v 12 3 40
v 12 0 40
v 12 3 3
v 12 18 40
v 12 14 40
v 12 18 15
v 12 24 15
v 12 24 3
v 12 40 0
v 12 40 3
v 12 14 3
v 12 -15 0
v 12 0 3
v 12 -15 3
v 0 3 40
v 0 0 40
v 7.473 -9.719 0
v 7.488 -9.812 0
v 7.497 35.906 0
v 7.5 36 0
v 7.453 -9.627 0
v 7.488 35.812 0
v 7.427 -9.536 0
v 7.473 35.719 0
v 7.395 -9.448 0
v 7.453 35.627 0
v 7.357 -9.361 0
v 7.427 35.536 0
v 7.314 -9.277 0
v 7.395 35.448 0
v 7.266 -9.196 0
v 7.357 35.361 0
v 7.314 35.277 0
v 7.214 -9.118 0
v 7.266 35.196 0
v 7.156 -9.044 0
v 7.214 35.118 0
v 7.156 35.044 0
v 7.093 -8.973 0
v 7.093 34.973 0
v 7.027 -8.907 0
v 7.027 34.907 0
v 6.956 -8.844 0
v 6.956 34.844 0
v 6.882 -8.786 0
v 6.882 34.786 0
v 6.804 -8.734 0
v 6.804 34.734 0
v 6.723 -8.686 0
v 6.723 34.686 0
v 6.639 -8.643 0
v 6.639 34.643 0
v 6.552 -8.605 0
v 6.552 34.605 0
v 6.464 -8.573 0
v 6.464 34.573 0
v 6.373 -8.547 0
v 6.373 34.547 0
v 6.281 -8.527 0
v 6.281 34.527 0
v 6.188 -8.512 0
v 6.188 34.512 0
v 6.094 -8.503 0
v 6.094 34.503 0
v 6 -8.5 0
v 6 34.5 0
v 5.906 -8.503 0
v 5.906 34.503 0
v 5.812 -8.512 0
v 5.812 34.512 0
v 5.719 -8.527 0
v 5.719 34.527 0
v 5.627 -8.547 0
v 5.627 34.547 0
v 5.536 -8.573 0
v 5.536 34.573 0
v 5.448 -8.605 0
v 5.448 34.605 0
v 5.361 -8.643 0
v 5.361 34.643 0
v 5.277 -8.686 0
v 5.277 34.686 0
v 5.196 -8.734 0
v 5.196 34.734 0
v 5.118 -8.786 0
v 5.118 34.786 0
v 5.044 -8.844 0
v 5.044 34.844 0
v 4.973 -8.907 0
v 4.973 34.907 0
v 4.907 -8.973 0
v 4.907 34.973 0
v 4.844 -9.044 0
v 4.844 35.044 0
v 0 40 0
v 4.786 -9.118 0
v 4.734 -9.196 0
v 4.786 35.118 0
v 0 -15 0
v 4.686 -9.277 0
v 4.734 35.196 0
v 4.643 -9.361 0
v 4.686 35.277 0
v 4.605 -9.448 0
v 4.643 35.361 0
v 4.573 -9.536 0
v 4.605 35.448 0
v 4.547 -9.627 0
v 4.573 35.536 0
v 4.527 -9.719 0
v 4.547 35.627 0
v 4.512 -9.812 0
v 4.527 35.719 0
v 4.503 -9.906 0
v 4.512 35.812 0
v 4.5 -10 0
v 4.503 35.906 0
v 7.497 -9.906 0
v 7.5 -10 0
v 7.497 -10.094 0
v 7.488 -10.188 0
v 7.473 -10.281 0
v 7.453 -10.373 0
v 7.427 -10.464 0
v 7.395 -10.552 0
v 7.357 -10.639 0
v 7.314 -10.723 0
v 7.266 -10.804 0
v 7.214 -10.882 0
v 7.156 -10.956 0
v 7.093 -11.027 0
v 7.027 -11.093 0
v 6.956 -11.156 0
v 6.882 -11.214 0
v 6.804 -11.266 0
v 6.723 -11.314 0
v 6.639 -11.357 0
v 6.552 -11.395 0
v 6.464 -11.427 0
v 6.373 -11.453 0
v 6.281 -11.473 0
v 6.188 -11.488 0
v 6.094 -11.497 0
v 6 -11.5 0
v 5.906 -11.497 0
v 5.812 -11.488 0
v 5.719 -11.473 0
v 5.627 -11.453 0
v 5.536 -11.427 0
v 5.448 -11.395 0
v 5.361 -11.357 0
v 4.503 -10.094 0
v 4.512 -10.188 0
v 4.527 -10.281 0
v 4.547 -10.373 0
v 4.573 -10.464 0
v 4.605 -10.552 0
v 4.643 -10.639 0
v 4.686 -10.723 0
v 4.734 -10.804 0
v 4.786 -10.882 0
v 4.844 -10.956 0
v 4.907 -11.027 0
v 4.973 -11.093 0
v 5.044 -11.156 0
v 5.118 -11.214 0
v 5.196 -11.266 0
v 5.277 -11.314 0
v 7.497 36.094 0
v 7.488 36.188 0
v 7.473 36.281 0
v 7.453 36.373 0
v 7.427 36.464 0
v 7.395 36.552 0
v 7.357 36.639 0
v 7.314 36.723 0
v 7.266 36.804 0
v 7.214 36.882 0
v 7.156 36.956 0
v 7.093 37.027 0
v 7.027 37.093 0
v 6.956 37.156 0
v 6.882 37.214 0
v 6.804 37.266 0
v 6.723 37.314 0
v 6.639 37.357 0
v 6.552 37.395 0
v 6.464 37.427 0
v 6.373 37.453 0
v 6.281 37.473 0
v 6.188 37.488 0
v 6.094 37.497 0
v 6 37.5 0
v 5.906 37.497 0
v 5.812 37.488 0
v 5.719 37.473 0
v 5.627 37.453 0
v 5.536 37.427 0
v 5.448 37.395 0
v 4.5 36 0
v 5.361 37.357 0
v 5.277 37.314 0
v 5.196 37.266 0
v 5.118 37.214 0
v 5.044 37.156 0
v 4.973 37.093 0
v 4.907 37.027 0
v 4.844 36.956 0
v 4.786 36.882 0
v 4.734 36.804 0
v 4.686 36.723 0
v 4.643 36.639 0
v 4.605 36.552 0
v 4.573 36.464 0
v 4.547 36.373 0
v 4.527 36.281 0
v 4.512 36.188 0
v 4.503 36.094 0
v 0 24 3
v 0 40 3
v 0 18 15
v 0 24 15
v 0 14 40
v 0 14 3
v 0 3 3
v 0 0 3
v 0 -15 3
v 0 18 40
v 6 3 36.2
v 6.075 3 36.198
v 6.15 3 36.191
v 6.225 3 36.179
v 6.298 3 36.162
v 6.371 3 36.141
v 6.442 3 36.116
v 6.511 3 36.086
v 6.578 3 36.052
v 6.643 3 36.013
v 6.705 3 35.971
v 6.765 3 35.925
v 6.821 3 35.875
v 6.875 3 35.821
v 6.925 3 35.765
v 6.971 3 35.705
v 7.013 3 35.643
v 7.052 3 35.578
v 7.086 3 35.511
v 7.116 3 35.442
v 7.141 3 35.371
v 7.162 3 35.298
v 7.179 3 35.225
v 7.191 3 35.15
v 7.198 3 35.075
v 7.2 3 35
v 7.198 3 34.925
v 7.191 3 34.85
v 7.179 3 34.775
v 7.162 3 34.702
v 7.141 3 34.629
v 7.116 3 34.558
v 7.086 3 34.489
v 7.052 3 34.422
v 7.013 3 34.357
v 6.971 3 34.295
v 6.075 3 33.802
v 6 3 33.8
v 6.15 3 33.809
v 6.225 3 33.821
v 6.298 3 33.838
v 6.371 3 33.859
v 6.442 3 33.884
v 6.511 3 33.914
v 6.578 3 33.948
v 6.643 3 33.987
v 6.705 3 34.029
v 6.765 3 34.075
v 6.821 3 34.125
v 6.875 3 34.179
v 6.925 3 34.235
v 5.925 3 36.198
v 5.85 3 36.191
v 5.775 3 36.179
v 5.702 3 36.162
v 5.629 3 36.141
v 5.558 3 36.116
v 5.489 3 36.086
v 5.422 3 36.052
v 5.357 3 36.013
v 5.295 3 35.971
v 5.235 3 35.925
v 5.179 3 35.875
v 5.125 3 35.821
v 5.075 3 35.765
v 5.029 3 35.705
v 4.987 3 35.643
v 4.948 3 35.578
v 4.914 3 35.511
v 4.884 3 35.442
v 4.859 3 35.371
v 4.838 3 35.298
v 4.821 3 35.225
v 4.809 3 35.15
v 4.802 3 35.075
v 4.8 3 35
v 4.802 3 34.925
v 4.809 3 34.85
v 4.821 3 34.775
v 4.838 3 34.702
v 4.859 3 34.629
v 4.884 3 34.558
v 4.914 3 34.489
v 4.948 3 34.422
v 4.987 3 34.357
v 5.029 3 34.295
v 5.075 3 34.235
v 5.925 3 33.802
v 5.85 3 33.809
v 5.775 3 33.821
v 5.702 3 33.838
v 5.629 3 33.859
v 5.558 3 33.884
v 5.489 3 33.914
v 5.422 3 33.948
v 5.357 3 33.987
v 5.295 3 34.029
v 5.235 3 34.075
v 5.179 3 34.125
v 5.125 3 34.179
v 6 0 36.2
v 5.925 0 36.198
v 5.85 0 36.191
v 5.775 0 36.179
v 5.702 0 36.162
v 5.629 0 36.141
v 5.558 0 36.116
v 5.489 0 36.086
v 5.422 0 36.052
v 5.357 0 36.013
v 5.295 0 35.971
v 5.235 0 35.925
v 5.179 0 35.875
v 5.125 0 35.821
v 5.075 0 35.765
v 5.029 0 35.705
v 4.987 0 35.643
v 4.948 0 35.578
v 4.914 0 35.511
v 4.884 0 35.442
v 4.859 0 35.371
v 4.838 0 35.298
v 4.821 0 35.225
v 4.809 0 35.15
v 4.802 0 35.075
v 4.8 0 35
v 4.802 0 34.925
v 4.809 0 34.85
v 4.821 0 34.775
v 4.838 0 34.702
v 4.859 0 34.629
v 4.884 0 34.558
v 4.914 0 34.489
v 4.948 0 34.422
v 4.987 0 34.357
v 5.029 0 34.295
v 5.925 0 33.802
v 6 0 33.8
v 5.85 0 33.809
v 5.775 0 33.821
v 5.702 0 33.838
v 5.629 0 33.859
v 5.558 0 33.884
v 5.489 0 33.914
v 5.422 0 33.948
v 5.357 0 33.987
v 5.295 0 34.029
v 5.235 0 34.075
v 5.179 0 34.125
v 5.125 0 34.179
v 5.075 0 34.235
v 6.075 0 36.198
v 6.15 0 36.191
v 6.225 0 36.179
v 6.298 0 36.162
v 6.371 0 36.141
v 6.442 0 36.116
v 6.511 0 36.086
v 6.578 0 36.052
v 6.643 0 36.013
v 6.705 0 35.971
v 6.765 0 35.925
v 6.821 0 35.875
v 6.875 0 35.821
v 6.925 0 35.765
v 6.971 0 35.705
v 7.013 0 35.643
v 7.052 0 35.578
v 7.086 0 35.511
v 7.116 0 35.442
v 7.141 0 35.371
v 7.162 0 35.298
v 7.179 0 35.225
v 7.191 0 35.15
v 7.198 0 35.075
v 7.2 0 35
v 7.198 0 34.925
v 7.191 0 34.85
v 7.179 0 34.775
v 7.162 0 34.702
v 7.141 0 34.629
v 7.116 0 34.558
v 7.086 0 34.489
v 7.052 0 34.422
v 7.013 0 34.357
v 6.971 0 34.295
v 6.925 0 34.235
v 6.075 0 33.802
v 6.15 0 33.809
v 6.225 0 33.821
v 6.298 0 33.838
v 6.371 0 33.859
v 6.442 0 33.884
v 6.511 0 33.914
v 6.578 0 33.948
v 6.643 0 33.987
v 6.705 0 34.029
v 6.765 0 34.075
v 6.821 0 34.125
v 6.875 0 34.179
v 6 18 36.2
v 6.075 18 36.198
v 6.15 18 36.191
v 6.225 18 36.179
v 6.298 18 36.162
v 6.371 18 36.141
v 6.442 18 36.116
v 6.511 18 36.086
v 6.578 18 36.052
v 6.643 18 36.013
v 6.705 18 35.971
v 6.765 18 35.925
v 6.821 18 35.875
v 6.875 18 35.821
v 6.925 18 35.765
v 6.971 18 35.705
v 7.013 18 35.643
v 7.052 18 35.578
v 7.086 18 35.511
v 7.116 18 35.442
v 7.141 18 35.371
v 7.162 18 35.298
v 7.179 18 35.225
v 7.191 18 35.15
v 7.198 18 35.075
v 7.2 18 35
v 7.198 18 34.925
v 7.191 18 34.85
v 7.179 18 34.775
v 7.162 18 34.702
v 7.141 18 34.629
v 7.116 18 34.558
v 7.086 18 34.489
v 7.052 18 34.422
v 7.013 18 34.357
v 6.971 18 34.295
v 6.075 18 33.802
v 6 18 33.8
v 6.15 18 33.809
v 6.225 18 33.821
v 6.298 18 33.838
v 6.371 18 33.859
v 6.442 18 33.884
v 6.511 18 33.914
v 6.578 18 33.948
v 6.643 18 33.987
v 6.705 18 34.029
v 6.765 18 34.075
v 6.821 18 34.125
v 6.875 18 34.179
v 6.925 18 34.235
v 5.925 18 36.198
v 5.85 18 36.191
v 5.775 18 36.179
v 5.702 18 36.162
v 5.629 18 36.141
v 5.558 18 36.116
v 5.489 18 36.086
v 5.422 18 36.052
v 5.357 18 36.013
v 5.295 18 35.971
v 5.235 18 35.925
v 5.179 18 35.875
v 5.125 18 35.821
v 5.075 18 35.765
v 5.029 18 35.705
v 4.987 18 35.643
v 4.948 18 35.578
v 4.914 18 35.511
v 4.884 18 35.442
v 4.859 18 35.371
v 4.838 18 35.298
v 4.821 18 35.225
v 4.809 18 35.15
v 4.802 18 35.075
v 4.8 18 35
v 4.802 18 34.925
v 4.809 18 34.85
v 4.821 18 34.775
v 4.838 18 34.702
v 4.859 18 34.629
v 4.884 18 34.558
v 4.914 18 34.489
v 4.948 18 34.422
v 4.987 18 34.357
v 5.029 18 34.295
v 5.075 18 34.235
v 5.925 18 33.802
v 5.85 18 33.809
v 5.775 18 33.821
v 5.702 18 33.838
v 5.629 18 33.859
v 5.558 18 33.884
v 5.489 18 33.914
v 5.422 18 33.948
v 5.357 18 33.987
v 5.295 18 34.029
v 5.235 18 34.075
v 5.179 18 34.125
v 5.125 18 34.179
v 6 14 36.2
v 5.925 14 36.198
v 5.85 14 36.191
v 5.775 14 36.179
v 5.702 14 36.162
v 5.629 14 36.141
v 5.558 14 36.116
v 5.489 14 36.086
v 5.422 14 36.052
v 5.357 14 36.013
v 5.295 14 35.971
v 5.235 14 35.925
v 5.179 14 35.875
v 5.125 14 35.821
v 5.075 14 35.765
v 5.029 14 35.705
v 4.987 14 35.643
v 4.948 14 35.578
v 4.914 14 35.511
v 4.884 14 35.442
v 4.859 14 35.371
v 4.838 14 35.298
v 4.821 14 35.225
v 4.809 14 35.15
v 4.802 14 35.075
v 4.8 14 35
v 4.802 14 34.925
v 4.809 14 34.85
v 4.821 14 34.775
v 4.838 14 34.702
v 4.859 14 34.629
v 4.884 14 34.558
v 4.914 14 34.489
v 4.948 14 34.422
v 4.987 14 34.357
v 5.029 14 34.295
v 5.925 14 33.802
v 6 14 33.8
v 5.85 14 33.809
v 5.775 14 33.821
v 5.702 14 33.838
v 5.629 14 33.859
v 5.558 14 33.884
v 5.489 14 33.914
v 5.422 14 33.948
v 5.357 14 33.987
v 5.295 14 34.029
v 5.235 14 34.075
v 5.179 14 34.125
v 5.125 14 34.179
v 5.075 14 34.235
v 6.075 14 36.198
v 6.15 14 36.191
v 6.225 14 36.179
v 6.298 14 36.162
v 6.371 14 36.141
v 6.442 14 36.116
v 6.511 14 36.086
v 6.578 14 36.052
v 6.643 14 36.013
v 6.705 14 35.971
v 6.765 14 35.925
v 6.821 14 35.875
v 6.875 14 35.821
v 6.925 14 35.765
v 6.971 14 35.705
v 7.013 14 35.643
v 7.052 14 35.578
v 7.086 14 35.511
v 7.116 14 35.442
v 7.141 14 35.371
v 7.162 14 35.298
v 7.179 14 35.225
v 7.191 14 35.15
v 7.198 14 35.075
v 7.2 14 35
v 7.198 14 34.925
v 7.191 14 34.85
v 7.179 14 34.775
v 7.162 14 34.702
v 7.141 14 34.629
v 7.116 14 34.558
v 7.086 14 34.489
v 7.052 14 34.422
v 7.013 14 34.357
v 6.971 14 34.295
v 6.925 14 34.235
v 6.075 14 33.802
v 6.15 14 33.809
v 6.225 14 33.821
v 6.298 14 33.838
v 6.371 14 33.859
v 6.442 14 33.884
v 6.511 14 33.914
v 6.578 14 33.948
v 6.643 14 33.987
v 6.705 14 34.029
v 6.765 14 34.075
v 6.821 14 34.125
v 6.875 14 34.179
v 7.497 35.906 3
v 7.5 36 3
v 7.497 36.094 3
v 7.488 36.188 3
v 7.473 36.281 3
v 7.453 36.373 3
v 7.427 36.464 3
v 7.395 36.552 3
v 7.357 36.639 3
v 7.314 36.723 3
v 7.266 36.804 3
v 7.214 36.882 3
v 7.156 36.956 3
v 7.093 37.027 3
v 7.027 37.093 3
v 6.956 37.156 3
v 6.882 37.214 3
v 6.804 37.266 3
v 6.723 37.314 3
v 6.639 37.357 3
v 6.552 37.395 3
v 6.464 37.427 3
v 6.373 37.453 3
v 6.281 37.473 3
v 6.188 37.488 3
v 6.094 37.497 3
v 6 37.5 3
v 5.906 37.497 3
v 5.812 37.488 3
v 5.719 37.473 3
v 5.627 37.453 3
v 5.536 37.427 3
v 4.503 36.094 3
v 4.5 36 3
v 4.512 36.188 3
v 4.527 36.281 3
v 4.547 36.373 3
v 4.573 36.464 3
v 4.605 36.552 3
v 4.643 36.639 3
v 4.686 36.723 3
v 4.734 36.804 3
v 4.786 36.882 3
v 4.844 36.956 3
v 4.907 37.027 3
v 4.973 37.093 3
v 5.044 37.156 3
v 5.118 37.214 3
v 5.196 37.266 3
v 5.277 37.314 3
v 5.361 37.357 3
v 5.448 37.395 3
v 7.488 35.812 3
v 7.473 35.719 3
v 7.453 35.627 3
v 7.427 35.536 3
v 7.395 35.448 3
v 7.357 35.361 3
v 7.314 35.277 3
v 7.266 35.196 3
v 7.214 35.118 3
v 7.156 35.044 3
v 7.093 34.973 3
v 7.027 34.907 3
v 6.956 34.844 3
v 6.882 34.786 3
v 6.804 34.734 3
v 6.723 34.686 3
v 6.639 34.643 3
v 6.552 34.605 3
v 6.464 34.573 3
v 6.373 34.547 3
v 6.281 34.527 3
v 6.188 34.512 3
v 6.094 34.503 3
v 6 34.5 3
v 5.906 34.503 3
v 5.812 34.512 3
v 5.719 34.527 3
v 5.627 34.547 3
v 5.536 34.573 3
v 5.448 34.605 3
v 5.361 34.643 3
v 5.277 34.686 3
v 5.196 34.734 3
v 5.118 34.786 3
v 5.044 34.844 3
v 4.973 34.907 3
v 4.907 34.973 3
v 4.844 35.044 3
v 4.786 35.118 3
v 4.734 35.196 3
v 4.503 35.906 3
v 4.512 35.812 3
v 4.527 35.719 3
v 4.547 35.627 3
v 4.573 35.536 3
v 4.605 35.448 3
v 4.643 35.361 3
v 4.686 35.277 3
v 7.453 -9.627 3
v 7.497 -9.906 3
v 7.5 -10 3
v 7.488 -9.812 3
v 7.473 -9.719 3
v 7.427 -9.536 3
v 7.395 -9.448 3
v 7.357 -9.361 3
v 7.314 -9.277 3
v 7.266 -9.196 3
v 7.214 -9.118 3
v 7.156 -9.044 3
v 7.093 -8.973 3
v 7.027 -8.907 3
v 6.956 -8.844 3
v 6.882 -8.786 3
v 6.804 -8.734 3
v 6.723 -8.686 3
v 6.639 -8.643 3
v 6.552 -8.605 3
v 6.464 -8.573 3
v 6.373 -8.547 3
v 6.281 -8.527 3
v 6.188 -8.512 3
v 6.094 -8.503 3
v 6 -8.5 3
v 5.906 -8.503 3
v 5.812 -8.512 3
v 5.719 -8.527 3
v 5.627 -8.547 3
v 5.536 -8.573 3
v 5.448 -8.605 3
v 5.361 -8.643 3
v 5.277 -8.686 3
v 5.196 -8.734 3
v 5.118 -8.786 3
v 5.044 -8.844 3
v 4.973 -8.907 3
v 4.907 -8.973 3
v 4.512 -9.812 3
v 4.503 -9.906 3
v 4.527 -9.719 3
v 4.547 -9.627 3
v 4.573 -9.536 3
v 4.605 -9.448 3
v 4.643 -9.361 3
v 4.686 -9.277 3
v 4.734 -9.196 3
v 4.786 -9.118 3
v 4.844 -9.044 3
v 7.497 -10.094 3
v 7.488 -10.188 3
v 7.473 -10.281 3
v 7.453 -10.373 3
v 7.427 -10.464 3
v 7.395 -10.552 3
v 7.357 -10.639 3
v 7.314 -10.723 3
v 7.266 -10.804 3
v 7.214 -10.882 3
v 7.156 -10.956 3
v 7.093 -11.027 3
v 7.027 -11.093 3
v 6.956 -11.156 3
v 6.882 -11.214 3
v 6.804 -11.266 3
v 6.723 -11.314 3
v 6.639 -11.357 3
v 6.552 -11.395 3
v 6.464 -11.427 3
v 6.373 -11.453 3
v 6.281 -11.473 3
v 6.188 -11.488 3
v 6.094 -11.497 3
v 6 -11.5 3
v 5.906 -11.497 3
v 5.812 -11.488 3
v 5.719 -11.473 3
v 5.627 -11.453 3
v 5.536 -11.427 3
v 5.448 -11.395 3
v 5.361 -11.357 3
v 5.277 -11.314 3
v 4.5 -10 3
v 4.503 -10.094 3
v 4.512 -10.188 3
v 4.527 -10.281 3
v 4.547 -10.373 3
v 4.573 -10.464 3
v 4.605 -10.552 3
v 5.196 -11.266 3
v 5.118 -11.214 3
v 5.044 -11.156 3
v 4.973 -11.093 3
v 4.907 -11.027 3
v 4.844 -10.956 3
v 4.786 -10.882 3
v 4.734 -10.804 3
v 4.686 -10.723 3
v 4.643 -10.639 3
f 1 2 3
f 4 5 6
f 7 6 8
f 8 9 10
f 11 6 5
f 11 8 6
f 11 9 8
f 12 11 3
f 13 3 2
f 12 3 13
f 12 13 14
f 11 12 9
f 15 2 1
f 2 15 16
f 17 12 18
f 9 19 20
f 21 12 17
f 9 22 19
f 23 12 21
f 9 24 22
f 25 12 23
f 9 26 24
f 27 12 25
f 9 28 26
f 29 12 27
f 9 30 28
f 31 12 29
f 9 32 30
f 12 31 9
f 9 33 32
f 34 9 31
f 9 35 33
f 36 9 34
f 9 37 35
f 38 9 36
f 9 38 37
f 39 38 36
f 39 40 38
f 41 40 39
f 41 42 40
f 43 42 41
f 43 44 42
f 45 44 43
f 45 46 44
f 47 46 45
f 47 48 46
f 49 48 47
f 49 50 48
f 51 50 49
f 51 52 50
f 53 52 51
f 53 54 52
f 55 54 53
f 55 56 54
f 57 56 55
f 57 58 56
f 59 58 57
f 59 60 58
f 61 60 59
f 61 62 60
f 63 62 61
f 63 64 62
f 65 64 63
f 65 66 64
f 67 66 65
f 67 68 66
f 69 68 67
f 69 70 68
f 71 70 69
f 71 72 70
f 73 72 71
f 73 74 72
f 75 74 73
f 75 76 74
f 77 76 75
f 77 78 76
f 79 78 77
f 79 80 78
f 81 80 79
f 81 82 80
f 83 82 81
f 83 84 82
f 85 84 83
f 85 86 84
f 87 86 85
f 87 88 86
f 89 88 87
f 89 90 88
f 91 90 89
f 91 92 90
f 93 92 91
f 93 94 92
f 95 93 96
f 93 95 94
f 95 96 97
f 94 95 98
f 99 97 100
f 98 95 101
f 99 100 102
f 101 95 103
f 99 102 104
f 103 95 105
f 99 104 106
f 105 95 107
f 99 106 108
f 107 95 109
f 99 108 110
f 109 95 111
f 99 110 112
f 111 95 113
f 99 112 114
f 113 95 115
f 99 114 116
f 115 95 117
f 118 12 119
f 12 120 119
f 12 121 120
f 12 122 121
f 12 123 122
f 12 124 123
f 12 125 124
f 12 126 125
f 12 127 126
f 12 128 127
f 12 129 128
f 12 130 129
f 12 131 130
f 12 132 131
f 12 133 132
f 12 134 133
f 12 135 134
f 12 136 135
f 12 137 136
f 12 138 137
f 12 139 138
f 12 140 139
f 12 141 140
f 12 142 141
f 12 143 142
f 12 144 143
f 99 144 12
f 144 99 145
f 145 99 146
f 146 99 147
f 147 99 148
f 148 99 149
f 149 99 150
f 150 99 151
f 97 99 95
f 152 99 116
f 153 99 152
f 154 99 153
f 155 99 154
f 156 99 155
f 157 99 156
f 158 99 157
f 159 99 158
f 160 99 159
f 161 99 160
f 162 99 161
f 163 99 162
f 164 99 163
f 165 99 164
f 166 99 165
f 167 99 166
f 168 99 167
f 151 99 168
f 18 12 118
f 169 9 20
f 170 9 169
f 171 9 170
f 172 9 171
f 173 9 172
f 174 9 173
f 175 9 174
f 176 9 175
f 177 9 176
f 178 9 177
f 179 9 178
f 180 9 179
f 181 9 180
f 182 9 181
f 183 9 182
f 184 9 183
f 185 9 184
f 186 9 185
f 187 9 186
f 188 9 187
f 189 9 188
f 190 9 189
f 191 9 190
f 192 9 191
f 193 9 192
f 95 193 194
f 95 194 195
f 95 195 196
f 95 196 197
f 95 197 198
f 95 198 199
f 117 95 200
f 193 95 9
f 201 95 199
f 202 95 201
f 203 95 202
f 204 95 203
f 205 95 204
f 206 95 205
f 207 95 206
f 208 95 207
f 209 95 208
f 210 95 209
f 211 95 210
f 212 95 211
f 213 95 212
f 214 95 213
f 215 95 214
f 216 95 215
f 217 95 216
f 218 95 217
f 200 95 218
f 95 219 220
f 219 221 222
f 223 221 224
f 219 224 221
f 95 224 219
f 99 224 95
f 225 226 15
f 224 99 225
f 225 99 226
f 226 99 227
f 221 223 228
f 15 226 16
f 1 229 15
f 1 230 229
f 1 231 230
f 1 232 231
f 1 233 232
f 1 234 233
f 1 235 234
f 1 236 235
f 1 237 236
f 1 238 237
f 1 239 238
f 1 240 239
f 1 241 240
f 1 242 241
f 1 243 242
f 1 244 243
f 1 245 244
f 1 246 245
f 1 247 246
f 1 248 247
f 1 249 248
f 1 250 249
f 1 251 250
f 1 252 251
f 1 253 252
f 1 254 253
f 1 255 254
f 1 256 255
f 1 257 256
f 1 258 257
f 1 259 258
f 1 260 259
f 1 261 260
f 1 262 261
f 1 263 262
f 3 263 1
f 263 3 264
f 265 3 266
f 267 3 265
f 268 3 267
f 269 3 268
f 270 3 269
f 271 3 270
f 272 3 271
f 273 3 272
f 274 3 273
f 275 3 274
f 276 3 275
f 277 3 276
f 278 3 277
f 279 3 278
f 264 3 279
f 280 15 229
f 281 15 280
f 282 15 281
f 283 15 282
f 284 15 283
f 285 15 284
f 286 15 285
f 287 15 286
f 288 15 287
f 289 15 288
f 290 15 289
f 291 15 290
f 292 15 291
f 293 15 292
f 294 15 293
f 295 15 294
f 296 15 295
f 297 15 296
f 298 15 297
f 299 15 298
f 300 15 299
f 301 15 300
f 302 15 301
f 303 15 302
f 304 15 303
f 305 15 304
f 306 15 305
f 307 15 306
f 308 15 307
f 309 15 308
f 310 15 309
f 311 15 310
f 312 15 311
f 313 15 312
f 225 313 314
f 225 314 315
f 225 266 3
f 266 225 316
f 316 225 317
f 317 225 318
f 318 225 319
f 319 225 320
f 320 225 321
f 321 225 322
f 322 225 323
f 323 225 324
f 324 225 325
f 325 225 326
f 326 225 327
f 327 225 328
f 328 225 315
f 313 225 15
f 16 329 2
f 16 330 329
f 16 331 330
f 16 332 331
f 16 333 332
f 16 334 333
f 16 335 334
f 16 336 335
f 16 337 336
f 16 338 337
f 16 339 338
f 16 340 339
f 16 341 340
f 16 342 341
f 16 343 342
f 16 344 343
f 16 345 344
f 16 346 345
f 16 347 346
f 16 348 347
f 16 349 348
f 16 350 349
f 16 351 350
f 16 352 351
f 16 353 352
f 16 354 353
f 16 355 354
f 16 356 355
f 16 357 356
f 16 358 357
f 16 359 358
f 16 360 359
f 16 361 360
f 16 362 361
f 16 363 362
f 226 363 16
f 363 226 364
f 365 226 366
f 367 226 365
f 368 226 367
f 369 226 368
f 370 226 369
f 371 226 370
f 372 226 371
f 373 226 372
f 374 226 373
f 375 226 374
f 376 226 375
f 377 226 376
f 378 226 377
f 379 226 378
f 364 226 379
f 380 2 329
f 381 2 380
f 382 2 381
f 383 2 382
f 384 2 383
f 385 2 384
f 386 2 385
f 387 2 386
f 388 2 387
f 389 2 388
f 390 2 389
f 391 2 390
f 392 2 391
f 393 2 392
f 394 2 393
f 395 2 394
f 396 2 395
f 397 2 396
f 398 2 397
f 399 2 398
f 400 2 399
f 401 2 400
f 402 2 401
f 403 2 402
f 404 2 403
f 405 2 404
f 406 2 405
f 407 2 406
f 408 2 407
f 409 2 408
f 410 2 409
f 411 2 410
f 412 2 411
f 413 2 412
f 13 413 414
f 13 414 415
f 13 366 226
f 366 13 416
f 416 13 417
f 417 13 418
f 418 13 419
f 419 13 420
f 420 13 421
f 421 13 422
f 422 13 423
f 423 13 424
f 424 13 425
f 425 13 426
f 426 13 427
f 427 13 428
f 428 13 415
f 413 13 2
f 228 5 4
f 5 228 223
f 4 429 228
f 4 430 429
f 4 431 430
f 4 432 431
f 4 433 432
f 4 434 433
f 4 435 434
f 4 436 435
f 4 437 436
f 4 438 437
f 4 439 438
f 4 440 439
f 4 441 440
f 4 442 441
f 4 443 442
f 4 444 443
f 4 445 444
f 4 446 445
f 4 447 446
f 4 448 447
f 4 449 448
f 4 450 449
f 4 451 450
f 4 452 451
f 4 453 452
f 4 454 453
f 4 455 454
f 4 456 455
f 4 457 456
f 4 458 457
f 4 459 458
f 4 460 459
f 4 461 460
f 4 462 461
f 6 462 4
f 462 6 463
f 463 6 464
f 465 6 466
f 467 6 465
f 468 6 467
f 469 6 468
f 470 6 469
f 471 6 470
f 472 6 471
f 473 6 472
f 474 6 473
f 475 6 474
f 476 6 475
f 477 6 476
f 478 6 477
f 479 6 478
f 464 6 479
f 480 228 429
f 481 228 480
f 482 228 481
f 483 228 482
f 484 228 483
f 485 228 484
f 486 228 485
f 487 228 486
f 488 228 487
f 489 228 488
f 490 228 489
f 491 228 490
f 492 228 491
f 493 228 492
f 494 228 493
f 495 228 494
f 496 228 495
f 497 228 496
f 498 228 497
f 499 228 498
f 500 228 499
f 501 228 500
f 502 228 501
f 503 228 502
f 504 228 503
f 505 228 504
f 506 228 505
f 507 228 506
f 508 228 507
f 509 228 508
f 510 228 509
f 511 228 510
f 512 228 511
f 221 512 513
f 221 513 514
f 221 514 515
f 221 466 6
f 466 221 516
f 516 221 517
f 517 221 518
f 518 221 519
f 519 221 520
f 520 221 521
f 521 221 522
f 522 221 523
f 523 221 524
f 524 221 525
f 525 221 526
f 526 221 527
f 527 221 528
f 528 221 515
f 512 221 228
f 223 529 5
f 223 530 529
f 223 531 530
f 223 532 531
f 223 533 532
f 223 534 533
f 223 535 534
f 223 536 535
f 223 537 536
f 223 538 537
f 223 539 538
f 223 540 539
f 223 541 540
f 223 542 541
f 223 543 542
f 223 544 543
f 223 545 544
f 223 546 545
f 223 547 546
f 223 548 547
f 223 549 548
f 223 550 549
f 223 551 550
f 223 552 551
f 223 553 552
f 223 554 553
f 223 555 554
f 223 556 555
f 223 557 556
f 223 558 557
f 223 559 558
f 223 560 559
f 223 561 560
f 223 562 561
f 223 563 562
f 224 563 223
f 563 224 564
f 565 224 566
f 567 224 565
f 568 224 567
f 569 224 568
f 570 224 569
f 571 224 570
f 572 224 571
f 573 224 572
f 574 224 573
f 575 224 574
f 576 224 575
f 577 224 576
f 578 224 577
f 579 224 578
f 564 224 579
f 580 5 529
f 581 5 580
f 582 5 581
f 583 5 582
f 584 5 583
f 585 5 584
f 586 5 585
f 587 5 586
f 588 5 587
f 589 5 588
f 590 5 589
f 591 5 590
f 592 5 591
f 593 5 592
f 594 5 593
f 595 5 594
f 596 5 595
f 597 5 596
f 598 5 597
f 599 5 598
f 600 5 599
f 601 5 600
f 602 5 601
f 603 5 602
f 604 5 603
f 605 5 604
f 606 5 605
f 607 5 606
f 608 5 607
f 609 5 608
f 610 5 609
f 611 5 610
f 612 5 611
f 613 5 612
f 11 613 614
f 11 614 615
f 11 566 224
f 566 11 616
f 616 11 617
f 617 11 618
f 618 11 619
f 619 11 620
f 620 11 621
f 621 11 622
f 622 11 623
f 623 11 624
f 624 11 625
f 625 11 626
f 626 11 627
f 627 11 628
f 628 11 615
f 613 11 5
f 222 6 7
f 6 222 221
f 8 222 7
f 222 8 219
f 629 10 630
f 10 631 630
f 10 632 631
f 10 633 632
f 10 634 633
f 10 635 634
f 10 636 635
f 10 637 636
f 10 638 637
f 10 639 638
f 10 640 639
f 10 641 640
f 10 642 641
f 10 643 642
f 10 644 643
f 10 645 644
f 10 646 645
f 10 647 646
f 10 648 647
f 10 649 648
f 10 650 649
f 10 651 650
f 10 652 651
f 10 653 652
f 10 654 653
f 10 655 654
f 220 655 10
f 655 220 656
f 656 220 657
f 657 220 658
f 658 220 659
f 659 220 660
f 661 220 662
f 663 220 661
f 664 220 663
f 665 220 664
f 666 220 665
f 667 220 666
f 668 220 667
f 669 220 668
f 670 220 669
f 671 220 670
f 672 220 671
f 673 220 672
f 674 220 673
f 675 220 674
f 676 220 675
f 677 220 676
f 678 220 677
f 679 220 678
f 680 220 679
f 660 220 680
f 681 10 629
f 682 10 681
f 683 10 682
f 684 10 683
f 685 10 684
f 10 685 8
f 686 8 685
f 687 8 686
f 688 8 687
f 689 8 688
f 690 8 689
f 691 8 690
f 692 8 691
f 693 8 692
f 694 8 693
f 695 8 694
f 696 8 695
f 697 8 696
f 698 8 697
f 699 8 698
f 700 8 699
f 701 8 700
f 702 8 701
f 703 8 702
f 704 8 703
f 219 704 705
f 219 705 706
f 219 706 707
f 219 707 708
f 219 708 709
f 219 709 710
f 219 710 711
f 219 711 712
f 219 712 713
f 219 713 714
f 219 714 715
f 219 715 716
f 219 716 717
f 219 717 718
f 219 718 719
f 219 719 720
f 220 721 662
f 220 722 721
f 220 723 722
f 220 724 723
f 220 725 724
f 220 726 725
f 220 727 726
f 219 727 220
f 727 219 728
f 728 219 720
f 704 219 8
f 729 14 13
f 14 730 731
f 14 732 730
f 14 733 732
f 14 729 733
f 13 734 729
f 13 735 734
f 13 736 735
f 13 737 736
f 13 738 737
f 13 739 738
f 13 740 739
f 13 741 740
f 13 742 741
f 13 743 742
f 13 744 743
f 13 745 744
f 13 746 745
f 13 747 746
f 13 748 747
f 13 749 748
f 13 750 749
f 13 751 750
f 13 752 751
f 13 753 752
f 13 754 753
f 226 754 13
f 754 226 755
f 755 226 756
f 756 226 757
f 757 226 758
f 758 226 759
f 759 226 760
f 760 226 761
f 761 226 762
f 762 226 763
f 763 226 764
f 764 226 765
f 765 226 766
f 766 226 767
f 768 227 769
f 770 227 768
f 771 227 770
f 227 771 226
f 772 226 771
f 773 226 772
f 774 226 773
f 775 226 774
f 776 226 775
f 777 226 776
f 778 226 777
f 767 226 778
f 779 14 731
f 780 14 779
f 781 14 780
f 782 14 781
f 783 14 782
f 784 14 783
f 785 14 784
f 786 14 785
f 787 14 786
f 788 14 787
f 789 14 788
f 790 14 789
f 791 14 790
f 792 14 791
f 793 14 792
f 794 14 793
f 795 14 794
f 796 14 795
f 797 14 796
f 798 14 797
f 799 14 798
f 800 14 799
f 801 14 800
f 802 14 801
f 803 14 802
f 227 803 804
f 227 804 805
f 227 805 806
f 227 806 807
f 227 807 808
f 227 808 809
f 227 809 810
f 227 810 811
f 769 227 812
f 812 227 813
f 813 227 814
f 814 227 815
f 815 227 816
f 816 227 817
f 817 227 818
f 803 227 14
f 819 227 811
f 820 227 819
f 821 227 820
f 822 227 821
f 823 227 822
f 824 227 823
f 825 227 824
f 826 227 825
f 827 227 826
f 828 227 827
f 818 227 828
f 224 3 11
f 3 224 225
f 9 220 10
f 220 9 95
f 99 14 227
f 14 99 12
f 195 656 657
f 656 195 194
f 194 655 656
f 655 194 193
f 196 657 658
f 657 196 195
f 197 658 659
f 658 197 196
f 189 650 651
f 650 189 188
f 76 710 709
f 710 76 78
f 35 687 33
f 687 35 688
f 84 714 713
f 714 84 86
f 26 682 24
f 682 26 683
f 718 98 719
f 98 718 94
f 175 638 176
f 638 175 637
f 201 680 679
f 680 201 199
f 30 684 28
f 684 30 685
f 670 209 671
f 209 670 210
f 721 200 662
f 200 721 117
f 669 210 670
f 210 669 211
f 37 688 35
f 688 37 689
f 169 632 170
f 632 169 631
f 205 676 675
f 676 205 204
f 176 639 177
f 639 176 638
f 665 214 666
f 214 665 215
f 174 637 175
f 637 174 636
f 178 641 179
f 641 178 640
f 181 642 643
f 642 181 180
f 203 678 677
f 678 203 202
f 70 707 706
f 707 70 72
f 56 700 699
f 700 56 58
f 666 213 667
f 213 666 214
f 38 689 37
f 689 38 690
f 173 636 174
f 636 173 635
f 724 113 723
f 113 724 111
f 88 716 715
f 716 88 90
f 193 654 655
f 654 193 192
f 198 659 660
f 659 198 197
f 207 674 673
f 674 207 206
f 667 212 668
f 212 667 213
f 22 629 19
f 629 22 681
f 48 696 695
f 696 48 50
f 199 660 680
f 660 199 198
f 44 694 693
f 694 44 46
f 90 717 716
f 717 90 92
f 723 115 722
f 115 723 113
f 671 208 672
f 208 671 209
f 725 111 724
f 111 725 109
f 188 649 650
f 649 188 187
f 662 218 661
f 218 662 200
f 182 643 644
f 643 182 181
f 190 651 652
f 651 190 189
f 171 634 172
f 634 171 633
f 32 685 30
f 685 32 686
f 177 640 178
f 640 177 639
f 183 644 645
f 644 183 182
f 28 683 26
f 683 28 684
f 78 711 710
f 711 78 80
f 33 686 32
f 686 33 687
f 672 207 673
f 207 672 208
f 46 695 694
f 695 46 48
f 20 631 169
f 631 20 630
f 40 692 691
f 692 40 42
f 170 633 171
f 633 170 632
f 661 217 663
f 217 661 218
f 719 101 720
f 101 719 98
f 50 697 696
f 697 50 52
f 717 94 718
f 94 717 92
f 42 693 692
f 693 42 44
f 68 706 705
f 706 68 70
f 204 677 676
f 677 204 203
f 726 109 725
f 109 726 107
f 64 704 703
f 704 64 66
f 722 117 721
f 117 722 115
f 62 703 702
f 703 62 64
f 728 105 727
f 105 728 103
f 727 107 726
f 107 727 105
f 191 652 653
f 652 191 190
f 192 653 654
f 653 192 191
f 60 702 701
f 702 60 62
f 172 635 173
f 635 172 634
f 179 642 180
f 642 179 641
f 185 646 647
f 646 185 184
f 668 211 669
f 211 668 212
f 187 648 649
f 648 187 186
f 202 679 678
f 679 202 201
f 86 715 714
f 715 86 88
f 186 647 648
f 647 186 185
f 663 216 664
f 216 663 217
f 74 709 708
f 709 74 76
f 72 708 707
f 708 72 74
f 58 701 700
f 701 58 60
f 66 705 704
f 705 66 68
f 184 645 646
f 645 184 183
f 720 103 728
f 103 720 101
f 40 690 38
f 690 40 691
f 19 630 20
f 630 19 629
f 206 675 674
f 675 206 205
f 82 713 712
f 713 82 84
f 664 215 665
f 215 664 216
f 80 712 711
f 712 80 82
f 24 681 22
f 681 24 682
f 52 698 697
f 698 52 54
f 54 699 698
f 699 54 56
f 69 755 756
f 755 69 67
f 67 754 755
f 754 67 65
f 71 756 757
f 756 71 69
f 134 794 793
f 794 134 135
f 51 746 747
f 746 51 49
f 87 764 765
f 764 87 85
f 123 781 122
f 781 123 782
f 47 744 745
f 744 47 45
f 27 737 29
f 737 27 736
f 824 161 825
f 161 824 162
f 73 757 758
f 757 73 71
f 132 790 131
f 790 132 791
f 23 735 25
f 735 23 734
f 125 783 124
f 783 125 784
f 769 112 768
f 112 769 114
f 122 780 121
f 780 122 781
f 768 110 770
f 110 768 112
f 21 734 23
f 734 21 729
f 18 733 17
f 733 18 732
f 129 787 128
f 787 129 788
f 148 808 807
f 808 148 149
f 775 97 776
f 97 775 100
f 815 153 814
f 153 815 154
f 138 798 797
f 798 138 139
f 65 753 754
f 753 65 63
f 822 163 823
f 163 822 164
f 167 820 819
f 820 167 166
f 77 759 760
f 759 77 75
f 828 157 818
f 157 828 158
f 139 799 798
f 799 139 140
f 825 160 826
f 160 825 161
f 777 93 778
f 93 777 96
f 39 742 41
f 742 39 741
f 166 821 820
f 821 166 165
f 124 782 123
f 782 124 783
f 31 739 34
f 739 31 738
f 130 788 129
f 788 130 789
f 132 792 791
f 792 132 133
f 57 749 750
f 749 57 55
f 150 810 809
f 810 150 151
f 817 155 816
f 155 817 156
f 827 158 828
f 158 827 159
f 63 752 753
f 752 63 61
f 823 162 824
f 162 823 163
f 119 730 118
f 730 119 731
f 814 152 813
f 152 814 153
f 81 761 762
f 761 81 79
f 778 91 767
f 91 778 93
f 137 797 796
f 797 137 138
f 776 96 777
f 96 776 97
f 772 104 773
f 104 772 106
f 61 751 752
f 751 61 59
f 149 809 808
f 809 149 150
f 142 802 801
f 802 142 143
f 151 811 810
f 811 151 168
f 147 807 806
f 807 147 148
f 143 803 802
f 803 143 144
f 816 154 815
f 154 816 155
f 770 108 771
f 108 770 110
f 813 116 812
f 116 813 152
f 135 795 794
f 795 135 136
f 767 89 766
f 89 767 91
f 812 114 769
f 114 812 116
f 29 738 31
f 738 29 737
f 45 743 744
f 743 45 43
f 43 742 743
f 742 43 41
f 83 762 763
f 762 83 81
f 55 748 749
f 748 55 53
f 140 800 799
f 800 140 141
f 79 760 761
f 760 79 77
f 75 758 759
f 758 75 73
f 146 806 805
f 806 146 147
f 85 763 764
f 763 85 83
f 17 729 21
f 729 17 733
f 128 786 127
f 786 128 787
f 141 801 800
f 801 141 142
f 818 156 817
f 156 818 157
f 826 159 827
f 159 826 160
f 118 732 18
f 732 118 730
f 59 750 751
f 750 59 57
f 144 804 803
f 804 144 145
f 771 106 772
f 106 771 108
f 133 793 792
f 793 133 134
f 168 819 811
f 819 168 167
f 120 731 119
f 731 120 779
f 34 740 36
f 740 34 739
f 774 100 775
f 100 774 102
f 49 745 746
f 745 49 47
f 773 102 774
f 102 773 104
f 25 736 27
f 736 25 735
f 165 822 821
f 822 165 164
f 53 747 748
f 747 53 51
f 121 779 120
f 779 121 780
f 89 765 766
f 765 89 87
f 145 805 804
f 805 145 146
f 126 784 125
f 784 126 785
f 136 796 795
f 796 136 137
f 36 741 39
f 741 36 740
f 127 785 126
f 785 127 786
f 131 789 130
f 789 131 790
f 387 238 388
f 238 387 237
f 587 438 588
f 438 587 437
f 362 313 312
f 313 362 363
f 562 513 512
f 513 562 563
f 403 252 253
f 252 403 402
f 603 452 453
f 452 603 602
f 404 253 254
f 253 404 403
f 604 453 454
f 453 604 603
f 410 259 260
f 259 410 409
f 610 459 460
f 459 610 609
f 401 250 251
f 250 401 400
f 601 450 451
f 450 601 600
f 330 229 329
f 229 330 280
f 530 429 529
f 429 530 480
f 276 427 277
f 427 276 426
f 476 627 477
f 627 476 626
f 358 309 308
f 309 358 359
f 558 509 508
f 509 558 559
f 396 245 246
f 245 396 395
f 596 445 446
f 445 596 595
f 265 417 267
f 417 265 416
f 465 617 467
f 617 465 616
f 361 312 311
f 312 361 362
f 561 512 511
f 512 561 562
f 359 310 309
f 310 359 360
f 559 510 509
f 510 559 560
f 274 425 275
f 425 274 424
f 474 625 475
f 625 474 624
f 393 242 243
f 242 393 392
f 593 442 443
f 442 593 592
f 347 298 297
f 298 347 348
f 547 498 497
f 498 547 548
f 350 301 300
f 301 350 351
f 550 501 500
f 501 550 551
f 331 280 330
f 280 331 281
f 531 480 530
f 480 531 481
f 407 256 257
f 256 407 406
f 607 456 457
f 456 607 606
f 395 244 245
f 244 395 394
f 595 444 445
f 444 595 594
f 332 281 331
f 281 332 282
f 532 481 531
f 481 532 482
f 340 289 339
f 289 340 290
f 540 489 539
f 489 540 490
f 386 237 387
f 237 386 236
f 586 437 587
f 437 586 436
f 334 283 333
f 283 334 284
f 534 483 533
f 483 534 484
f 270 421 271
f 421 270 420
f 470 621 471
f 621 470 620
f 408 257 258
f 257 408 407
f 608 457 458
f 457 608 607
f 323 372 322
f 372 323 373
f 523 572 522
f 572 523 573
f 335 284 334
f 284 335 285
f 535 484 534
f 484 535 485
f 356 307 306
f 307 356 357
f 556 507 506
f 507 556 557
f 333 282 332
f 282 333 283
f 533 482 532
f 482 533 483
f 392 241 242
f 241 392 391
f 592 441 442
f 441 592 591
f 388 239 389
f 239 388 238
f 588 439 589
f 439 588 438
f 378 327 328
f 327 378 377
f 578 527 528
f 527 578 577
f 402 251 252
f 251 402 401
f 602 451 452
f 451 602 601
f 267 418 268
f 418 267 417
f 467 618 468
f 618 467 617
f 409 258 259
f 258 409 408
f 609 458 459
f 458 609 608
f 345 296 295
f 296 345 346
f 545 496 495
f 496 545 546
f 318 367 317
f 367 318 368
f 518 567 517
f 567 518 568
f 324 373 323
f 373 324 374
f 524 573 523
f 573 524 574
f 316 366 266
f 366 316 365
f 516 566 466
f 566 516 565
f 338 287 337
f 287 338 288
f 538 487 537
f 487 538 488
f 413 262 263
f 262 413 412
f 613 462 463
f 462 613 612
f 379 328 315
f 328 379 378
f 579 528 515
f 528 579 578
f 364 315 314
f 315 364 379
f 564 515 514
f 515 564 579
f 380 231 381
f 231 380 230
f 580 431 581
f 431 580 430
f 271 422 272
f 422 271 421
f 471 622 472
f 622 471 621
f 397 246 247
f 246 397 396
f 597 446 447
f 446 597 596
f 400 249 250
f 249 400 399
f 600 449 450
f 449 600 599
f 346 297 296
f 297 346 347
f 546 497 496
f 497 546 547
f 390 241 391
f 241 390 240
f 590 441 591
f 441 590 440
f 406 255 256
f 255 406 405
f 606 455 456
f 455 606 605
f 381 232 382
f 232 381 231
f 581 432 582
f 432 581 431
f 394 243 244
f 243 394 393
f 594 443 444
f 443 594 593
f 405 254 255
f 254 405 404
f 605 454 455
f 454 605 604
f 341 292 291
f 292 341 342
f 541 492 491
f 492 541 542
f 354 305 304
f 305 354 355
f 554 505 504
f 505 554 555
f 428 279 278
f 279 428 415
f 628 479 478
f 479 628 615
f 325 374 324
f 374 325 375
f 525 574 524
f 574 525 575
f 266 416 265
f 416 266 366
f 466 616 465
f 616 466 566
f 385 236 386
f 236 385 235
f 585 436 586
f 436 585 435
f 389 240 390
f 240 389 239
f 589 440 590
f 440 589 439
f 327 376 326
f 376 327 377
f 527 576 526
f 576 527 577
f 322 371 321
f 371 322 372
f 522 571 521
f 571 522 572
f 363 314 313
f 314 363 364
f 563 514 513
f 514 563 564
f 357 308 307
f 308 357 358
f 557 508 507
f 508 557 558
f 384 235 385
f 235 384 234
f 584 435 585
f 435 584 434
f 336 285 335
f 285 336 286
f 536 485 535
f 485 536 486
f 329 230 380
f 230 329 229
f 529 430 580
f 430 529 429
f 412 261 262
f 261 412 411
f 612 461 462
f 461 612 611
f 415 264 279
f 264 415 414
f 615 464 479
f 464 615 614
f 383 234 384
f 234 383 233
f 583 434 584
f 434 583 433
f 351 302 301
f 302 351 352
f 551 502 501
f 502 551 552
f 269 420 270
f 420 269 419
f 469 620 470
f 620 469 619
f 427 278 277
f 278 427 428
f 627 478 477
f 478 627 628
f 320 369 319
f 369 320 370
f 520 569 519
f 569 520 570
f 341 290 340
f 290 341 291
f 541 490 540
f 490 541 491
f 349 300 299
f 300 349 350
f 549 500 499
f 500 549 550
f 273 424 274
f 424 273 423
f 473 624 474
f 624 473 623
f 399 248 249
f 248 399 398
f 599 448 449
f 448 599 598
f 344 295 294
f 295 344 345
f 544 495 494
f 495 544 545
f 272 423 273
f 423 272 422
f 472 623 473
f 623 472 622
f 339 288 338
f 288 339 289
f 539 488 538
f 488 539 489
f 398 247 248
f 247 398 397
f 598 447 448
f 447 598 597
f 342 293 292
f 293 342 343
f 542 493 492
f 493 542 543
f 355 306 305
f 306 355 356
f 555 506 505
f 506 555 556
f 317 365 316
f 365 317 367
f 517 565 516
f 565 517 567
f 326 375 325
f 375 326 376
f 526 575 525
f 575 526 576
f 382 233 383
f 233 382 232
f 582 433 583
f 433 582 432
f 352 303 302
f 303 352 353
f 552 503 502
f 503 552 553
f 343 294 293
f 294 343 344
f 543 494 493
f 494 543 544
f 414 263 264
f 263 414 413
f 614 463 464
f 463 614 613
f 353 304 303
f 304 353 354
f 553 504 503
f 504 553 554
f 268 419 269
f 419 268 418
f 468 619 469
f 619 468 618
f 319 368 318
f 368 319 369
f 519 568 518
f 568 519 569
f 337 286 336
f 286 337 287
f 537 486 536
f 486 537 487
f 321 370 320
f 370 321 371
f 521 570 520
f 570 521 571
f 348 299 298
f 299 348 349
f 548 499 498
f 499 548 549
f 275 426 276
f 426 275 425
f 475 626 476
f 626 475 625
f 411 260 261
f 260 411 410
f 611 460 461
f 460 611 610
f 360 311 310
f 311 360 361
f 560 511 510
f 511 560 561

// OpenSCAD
        difference(){
            union(){

                translate([0,0,0]){
                    cube([12,3,40], center=false);
                }      


                translate([0,14,0]){
                    cube([12,4,40], center=false);
                }      

                translate([0,14,0]){
                    cube([12,10,15], center=false);
                }      


                translate([0,-15,0]){
                    cube([12,55,3], center=false);
                }      


            }
            union() {

                translate([6,36,-1]){
                    rotate([0,0,90]){
                        cylinder(h=10, r=1.5, $fn=100, center=false);
                    }
                }  
                translate([6,-10,-1]){
                    rotate([0,0,90]){
                        cylinder(h=10, r=1.5, $fn=100, center=false);
                    }
                }  

                translate([6,50,35]){
                    rotate([90,0,0]){
                        cylinder(h=100, r=1.2, $fn=100, center=false);
                    }
                }  


            }
        }
